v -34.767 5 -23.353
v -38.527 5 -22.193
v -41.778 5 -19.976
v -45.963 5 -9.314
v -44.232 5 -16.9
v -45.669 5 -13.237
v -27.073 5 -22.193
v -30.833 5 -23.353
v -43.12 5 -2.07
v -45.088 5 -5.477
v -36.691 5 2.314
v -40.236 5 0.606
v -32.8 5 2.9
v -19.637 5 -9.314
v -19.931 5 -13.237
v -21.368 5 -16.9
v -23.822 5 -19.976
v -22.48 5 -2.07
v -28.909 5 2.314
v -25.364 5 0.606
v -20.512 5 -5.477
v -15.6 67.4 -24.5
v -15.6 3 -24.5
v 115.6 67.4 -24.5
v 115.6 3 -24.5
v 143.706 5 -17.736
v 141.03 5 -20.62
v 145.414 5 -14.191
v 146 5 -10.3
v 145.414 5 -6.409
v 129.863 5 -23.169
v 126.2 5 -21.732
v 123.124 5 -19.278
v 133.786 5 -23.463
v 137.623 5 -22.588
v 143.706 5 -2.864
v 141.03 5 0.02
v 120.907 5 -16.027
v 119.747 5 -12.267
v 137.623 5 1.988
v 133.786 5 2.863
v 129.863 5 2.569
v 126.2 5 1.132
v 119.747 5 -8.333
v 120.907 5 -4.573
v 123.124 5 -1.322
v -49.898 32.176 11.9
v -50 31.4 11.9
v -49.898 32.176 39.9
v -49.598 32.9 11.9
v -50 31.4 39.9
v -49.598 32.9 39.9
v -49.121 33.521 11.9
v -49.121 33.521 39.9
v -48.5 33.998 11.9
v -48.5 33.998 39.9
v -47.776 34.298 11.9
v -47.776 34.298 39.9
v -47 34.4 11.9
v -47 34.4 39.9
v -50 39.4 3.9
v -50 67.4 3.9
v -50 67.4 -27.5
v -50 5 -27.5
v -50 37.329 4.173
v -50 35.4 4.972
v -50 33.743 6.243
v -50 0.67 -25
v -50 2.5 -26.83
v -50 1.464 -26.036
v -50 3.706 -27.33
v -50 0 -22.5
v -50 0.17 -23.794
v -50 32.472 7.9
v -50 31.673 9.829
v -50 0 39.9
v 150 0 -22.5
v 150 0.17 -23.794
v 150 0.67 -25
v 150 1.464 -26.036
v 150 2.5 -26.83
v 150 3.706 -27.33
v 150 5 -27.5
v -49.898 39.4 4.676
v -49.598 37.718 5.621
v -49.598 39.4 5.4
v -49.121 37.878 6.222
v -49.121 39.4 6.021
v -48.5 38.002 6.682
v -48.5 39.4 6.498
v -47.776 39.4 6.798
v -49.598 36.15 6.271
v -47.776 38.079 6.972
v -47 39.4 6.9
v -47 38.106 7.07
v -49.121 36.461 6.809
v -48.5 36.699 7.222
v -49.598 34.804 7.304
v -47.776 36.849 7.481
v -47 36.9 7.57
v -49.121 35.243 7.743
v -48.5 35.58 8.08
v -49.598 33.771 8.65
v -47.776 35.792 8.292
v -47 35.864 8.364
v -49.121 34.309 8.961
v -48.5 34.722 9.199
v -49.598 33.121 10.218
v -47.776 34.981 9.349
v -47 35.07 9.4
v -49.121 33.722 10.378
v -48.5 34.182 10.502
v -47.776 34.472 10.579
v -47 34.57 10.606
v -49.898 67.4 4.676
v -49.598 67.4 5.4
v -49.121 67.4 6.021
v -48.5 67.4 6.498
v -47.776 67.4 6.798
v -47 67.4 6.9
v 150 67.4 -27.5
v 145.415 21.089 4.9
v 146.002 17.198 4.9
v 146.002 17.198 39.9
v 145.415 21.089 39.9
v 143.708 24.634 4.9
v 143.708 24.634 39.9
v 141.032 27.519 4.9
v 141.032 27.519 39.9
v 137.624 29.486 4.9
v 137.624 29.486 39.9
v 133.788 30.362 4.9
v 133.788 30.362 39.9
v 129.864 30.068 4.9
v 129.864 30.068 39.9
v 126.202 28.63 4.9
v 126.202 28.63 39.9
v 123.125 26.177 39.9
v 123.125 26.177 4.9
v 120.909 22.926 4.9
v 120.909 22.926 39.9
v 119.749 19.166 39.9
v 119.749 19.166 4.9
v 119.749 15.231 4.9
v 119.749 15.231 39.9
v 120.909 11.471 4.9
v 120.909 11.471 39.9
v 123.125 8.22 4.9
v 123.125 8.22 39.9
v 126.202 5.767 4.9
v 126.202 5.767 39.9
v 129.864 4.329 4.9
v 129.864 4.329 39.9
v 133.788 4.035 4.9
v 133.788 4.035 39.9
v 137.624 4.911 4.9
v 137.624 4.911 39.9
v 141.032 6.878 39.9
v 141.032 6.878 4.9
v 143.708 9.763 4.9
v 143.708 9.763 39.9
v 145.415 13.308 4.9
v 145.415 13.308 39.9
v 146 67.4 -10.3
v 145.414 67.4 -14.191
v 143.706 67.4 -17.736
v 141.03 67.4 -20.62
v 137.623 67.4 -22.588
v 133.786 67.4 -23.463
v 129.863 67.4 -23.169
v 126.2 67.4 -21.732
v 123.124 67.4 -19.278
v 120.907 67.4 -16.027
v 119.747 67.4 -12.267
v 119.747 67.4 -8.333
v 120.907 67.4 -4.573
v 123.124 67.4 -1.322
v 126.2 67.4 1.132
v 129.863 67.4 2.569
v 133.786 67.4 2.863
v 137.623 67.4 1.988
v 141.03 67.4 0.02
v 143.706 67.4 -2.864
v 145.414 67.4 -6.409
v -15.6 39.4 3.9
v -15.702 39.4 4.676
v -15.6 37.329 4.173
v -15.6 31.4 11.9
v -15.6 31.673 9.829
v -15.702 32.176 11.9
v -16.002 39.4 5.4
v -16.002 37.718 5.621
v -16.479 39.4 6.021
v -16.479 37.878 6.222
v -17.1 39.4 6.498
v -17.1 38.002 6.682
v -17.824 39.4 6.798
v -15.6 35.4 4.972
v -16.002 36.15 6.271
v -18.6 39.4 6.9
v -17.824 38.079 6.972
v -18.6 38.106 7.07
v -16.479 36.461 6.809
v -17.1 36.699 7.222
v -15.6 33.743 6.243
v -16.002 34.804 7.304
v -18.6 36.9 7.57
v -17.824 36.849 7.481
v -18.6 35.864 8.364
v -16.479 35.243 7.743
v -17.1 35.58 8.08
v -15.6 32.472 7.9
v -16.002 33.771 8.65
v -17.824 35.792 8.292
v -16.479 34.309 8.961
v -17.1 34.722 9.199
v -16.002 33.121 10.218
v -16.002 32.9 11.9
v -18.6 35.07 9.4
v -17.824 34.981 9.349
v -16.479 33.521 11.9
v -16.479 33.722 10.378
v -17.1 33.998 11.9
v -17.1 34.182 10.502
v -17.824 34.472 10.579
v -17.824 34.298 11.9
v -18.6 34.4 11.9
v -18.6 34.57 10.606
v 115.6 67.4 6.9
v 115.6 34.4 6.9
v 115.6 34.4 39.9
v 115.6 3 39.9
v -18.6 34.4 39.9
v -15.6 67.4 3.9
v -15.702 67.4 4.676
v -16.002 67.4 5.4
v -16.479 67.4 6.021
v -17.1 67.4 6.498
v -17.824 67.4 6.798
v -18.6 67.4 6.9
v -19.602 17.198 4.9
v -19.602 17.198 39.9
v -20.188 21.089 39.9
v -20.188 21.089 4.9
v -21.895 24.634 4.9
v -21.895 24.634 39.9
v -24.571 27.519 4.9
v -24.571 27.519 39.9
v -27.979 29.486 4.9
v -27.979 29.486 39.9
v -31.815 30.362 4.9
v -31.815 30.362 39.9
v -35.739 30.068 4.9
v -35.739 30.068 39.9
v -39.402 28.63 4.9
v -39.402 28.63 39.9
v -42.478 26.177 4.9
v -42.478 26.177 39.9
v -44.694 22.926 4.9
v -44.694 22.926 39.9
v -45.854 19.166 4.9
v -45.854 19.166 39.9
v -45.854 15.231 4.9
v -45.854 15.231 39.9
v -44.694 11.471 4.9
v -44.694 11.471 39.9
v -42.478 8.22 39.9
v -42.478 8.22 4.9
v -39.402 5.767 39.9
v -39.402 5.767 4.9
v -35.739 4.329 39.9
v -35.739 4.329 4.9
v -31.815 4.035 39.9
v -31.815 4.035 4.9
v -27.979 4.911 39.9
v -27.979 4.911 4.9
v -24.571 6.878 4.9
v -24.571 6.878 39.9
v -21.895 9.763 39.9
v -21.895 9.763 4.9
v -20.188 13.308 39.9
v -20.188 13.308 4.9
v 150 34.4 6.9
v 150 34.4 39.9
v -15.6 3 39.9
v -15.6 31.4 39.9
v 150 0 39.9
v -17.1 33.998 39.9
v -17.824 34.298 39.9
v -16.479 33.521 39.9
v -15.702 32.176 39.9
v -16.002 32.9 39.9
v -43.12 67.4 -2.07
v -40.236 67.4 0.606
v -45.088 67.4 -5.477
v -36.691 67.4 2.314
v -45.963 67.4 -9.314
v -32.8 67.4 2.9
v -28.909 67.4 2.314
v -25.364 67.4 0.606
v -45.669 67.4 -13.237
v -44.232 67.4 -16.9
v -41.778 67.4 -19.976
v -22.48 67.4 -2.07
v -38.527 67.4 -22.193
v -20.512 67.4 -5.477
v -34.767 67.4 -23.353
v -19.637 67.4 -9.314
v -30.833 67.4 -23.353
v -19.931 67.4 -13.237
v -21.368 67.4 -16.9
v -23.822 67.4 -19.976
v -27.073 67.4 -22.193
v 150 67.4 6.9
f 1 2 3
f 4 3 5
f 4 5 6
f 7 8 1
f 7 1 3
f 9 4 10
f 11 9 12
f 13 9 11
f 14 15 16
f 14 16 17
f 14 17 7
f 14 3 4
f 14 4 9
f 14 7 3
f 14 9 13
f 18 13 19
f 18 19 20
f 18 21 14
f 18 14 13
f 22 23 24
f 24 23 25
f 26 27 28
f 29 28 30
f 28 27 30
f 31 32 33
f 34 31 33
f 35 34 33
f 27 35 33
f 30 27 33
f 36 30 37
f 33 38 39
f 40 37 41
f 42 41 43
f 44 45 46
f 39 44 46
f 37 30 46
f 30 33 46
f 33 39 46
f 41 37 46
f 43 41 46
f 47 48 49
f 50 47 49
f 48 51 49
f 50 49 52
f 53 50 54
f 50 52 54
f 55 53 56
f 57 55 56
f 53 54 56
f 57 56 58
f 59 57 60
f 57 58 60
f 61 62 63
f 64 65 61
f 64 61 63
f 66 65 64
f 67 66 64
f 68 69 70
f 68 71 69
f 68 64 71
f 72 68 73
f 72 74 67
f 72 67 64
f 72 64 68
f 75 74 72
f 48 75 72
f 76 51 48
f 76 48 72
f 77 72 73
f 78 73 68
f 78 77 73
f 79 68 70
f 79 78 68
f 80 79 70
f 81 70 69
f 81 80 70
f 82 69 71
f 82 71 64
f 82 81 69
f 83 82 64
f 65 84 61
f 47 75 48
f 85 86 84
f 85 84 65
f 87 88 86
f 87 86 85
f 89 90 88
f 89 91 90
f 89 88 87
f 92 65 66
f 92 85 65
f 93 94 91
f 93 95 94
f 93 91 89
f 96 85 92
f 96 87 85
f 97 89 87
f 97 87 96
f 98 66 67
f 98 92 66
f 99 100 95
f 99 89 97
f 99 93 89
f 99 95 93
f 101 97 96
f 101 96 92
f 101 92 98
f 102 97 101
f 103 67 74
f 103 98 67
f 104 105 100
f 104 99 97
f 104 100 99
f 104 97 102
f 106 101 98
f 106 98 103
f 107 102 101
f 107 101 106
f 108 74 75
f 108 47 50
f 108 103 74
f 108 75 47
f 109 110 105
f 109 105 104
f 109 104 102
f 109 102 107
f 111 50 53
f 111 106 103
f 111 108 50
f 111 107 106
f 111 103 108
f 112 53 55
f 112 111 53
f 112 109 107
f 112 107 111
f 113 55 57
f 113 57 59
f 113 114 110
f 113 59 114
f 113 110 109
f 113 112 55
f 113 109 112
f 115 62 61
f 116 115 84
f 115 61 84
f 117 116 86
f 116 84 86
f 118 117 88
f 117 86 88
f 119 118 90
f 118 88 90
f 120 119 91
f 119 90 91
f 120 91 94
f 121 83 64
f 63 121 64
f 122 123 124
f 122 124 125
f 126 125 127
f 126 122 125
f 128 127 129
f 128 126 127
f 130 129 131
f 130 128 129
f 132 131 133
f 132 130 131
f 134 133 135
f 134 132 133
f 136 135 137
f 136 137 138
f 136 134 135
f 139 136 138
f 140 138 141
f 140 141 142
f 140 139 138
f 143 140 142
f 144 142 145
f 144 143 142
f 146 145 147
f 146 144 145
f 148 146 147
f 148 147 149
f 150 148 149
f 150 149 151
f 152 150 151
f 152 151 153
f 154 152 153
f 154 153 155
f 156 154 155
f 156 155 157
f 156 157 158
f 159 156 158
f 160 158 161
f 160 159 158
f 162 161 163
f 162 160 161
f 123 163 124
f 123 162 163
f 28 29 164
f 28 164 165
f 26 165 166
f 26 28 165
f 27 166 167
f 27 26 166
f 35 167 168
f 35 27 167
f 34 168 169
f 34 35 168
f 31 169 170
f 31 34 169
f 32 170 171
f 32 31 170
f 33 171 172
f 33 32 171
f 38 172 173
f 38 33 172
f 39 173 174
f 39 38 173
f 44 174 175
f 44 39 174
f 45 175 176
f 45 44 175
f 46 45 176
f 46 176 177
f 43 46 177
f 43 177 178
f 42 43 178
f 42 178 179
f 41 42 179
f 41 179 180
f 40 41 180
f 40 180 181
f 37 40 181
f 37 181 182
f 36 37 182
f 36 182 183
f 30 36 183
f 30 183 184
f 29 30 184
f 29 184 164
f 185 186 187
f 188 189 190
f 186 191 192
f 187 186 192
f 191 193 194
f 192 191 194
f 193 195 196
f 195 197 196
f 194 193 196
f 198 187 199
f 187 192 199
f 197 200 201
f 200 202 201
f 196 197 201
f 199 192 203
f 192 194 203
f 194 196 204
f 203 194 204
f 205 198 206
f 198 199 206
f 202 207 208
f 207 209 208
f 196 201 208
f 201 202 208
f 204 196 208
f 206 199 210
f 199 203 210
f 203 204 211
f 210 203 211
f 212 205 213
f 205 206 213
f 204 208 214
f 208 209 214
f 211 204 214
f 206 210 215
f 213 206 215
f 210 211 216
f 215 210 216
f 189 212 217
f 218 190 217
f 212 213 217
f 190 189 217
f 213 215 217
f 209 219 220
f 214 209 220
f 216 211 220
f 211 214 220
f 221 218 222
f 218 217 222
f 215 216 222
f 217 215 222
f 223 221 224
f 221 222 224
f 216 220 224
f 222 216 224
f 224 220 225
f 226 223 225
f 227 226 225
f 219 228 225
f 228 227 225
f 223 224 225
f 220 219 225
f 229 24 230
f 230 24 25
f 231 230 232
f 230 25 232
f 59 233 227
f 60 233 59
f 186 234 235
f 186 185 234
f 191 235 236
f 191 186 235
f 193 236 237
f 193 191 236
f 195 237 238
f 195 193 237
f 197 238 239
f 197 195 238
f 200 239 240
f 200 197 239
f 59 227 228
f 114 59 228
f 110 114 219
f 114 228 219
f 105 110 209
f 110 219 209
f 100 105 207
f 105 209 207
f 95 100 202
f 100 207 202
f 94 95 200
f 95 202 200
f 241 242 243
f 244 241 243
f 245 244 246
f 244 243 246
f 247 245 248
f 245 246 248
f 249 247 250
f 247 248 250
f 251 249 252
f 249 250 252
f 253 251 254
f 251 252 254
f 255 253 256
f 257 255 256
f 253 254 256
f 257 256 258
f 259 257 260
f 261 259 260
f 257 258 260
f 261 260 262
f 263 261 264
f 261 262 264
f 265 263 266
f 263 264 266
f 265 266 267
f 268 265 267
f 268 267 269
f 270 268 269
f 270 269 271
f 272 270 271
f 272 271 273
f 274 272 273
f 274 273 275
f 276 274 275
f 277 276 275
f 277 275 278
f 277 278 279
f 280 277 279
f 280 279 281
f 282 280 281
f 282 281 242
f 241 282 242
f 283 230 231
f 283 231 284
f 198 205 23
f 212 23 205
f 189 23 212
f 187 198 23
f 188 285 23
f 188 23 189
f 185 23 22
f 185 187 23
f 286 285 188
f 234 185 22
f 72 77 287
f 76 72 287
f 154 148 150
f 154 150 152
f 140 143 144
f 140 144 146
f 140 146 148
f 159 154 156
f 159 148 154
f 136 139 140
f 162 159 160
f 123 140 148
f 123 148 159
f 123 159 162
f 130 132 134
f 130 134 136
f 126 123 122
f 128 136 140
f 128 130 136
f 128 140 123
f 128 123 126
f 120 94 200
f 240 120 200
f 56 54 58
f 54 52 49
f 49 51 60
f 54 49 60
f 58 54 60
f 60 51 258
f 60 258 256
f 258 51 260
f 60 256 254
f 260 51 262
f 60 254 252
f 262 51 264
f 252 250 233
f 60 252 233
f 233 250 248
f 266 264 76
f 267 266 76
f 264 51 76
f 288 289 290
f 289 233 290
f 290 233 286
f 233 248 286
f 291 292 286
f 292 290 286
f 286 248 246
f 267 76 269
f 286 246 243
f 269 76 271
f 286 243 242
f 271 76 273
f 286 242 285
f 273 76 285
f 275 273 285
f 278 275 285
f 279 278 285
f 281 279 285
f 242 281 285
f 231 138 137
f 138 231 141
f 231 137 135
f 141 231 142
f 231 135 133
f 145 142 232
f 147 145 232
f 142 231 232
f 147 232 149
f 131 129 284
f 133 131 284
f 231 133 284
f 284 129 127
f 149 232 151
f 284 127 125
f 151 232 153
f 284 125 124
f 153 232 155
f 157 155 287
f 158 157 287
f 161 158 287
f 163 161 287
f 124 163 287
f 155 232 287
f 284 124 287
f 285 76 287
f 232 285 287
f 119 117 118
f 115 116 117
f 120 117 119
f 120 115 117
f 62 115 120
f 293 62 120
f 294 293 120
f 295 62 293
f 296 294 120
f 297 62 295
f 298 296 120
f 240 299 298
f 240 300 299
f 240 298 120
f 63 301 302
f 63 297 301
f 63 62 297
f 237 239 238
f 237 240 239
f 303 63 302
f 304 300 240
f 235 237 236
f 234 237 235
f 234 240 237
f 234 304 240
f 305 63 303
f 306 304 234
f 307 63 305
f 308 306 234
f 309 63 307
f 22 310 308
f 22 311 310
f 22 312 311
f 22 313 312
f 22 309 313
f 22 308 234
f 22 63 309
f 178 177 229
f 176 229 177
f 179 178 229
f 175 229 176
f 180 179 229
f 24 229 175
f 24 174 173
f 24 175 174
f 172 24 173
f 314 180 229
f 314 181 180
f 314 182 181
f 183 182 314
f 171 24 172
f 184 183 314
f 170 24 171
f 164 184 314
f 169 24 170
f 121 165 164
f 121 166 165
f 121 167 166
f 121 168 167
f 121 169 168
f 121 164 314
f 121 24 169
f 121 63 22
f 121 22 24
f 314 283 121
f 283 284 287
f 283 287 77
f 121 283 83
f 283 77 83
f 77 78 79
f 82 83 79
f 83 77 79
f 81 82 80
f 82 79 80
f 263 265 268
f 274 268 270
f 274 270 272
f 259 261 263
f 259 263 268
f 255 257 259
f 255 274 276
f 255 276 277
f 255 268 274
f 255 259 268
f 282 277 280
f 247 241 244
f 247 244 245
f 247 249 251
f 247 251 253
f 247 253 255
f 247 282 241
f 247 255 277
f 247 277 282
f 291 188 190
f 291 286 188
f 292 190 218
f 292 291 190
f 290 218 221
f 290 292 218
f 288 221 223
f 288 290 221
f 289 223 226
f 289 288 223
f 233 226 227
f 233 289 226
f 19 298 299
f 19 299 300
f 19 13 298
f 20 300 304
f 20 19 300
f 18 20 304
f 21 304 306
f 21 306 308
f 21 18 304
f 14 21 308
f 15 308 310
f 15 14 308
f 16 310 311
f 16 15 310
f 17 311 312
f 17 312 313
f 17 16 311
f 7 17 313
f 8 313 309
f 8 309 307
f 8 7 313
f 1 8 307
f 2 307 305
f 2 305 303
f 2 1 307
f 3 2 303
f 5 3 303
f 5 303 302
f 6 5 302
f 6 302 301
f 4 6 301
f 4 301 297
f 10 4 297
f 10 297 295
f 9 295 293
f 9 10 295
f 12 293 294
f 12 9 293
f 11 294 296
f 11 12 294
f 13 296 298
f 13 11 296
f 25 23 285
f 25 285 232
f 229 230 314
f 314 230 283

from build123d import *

# Parameters (mm, degrees)
SKETCH1_R           = 13.2
BOSS_EXTRUDE3_DEPTH = 5
SKETCH1_6_W         = 100
SKETCH1_6_H         = 55
SKETCH1_6_R         = 13.2
BOSS_EXTRUDE4_DEPTH = 55
SKETCH2_W           = 65.6
SKETCH2_H           = 52
CUT_EXTRUDE1_DEPTH  = 52
SKETCH3_R           = 13.2
CUT_EXTRUDE2_DEPTH  = 22.6
SKETCH4_W           = 20.6
SKETCH4_H           = 20.6
CUT_EXTRUDE4_DEPTH  = 39
SKETCH9_R           = 13.2
BOSS_EXTRUDE5_DEPTH = 12.4
BOSS_EXTRUDE7_START = 12.4
SKETCH10_R          = 13.2
BOSS_EXTRUDE7_DEPTH = 12.4
MIRROR1_START       = 30.398461356
MIRROR1_OUTLINE_R   = 13.2
MIRROR1_DEPTH       = 37.001538644
MIRROR1_2_OUTLINE_W = 100
MIRROR1_2_OUTLINE_H = 67.4
MIRROR1_2_OUTLINE_R = 13.2
MIRROR1_2_DEPTH     = 3
MIRROR1_3_OUTLINE_W = 34.4
MIRROR1_3_OUTLINE_H = 33
MIRROR1_3_DEPTH     = 4.001538644
MIRROR1_START_2     = 3
MIRROR1_4_OUTLINE_R = 13.2
MIRROR1_4_DEPTH     = 0.998461256
MIRROR1_START_3     = 3.998461256
MIRROR1_5_OUTLINE_R = 13.2
MIRROR1_5_DEPTH     = 26.4000001
MIRROR1_START_4     = 4.9
MIRROR1_6_OUTLINE_R = 13.2
MIRROR1_6_DEPTH     = 35
FILLET3_R           = 5
FILLET4_R           = 5
FILLET5_R           = 3
FILLET6_R           = 3


with BuildPart() as part:
    # Sketch1 → Boss-Extrude3 (new body)
    with BuildSketch(Plane(origin=(0, 0, 0), x_dir=(1, 0, 0), z_dir=(0, 1, 0))):
        with Locations(Location((-32.8, 10.3, 0), (0, 0, 270))):
            Circle(SKETCH1_R)
    boss_extrude3 = extrude(amount=BOSS_EXTRUDE3_DEPTH)

    # Sketch1<6> → Boss-Extrude4 (add)
    with BuildSketch(Plane(origin=(0, 0, 0), x_dir=(1, 0, 0), z_dir=(0, 1, 0))):
        Rectangle(SKETCH1_6_W, SKETCH1_6_H)
        with Locations(Location((-32.8, 10.3, 0), (0, 0, 270))):
            Circle(SKETCH1_6_R, mode=Mode.SUBTRACT)
    extrude(amount=BOSS_EXTRUDE4_DEPTH)

    # Sketch2 → Cut-Extrude1 (cut)
    with BuildSketch(Plane(origin=(0, 55, 0), x_dir=(1, 0, 0), z_dir=(0, 1, 0))):
        with Locations((17.2, -1.5)):
            Rectangle(SKETCH2_W, SKETCH2_H)
    extrude(amount=-CUT_EXTRUDE1_DEPTH, mode=Mode.SUBTRACT)

    # Sketch3 → Cut-Extrude2 (cut)
    with BuildSketch(Plane.XY.offset(27.5)):
        with Locations((-32.801538644, 17.198461356)):
            Circle(SKETCH3_R)
    extrude(amount=-CUT_EXTRUDE2_DEPTH, mode=Mode.SUBTRACT)

    # Sketch4 → Cut-Extrude4 (cut)
    with BuildSketch(Plane.ZY.offset(50)):
        with Locations((17.2, 44.7)):
            Rectangle(SKETCH4_W, SKETCH4_H)
    extrude(amount=-CUT_EXTRUDE4_DEPTH, mode=Mode.SUBTRACT)

    # Sketch9 → Boss-Extrude5 (add)
    with BuildSketch(Plane(origin=(0, 55, 0), x_dir=(1, 0, 0), z_dir=(0, 1, 0))):
        Polygon((-50, -6.9), (-15.6, -6.9), (-15.6, 24.5), (50, 24.5), (50, 27.5), (-50, 27.5), align=None)
        with Locations(Location((-32.8, 10.3, 0), (0, 0, 270))):
            Circle(SKETCH9_R, mode=Mode.SUBTRACT)
    extrude(amount=BOSS_EXTRUDE5_DEPTH)

    # Sketch10 → Boss-Extrude7 (add)
    with BuildSketch(Plane.XY.offset(27.5).offset(BOSS_EXTRUDE7_START)):
        Polygon((-15.6, 3), (-15.6, 34.4), (-50, 34.4), (-50, 0), (50, 0), (50, 3), align=None)
        with Locations((-32.801538644, 17.198461356)):
            Circle(SKETCH10_R, mode=Mode.SUBTRACT)
    extrude(amount=-BOSS_EXTRUDE7_DEPTH)

    # Mirror1: read off the stored shape, not the designer's step
    # Mirror1 outline → Mirror1 (add)
    with BuildSketch(Plane(origin=(0, 0, 0), x_dir=(1, 0, 0), z_dir=(0, 1, 0)).offset(MIRROR1_START)):
        Polygon((150, -6.9), (150, 27.5), (50, 27.5), (50, 24.5), (115.6, 24.5), (115.6, -6.9), align=None)
        with Locations((132.8, 10.3)):
            Circle(MIRROR1_OUTLINE_R, mode=Mode.SUBTRACT)
    extrude(amount=MIRROR1_DEPTH)

    # Mirror1 2 outline → Mirror1 2 (add)
    with BuildSketch(Plane(origin=(0, 0, 0), x_dir=(1, 0, 0), z_dir=(0, 1, 0))):
        with Locations((100, -6.2)):
            Rectangle(MIRROR1_2_OUTLINE_W, MIRROR1_2_OUTLINE_H)
        with Locations((132.8, 10.3)):
            Circle(MIRROR1_2_OUTLINE_R, mode=Mode.SUBTRACT)
    extrude(amount=MIRROR1_2_DEPTH)

    # Mirror1 3 outline → Mirror1 3 (add)
    with BuildSketch(Plane(origin=(0, 0, 0), x_dir=(1, 0, 0), z_dir=(0, 1, 0)).offset(MIRROR1_START)):
        with Locations((132.8, -23.4)):
            Rectangle(MIRROR1_3_OUTLINE_W, MIRROR1_3_OUTLINE_H)
    extrude(amount=MIRROR1_3_DEPTH)

    # Mirror1 4 outline → Mirror1 4 (add)
    with BuildSketch(Plane(origin=(0, 0, 0), x_dir=(1, 0, 0), z_dir=(0, 1, 0)).offset(MIRROR1_START_2)):
        Polygon((150, 27.5), (50, 27.5), (50, 24.5), (115.6, 24.5), (115.6, -39.9), (150, -39.9), align=None)
        with Locations((132.8, 10.3)):
            Circle(MIRROR1_4_OUTLINE_R, mode=Mode.SUBTRACT)
    extrude(amount=MIRROR1_4_DEPTH)

    # Mirror1 5 outline → Mirror1 5 (add)
    with BuildSketch(Plane(origin=(0, 0, 0), x_dir=(1, 0, 0), z_dir=(0, 1, 0)).offset(MIRROR1_START_3)):
        Polygon((150, -39.9), (150, 27.5), (50, 27.5), (50, 24.5), (115.6, 24.5), (115.6, -39.9), align=None)
        with Locations((132.8, 10.3)):
            Circle(MIRROR1_5_OUTLINE_R, mode=Mode.SUBTRACT)
    extrude(amount=MIRROR1_5_DEPTH)

    # Mirror1 6 outline → Mirror1 6 (cut)
    with BuildSketch(Plane.XY.offset(MIRROR1_START_4)):
        with Locations((132.801538644, 17.198461356)):
            Circle(MIRROR1_6_OUTLINE_R)
    extrude(amount=MIRROR1_6_DEPTH, mode=Mode.SUBTRACT)

    # Mirror2: Boss-Extrude3 across plane
    add(boss_extrude3.mirror(Plane.ZY.offset(-50)))

    # Fillet3
    fillet3_edges = [part.edges().sort_by_distance(p)[0] for p in [
        (50, 0, -27.5),
    ]]
    fillet(fillet3_edges, radius=FILLET3_R)

    # Fillet4
    fillet4_edges = [part.edges().sort_by_distance(p)[0] for p in [
        (-32.8, 34.4, 6.9),
    ]]
    fillet(fillet4_edges, radius=FILLET4_R)

    # Fillet5
    fillet5_edges = [part.edges().sort_by_distance(p)[0] for p in [
        (-50, 34.4, 25.9),
        (-50, 35.864466094, 8.364466094),
        (-50, 53.4, 6.9),
    ]]
    fillet(fillet5_edges, radius=FILLET5_R)

    # Fillet6
    fillet6_edges = [part.edges().sort_by_distance(p)[0] for p in [
        (-15.6, 34.4, 25.9),
        (-15.6, 35.864466094, 8.364466094),
        (-15.6, 53.4, 6.9),
    ]]
    fillet(fillet6_edges, radius=FILLET6_R)


solid = part.part
